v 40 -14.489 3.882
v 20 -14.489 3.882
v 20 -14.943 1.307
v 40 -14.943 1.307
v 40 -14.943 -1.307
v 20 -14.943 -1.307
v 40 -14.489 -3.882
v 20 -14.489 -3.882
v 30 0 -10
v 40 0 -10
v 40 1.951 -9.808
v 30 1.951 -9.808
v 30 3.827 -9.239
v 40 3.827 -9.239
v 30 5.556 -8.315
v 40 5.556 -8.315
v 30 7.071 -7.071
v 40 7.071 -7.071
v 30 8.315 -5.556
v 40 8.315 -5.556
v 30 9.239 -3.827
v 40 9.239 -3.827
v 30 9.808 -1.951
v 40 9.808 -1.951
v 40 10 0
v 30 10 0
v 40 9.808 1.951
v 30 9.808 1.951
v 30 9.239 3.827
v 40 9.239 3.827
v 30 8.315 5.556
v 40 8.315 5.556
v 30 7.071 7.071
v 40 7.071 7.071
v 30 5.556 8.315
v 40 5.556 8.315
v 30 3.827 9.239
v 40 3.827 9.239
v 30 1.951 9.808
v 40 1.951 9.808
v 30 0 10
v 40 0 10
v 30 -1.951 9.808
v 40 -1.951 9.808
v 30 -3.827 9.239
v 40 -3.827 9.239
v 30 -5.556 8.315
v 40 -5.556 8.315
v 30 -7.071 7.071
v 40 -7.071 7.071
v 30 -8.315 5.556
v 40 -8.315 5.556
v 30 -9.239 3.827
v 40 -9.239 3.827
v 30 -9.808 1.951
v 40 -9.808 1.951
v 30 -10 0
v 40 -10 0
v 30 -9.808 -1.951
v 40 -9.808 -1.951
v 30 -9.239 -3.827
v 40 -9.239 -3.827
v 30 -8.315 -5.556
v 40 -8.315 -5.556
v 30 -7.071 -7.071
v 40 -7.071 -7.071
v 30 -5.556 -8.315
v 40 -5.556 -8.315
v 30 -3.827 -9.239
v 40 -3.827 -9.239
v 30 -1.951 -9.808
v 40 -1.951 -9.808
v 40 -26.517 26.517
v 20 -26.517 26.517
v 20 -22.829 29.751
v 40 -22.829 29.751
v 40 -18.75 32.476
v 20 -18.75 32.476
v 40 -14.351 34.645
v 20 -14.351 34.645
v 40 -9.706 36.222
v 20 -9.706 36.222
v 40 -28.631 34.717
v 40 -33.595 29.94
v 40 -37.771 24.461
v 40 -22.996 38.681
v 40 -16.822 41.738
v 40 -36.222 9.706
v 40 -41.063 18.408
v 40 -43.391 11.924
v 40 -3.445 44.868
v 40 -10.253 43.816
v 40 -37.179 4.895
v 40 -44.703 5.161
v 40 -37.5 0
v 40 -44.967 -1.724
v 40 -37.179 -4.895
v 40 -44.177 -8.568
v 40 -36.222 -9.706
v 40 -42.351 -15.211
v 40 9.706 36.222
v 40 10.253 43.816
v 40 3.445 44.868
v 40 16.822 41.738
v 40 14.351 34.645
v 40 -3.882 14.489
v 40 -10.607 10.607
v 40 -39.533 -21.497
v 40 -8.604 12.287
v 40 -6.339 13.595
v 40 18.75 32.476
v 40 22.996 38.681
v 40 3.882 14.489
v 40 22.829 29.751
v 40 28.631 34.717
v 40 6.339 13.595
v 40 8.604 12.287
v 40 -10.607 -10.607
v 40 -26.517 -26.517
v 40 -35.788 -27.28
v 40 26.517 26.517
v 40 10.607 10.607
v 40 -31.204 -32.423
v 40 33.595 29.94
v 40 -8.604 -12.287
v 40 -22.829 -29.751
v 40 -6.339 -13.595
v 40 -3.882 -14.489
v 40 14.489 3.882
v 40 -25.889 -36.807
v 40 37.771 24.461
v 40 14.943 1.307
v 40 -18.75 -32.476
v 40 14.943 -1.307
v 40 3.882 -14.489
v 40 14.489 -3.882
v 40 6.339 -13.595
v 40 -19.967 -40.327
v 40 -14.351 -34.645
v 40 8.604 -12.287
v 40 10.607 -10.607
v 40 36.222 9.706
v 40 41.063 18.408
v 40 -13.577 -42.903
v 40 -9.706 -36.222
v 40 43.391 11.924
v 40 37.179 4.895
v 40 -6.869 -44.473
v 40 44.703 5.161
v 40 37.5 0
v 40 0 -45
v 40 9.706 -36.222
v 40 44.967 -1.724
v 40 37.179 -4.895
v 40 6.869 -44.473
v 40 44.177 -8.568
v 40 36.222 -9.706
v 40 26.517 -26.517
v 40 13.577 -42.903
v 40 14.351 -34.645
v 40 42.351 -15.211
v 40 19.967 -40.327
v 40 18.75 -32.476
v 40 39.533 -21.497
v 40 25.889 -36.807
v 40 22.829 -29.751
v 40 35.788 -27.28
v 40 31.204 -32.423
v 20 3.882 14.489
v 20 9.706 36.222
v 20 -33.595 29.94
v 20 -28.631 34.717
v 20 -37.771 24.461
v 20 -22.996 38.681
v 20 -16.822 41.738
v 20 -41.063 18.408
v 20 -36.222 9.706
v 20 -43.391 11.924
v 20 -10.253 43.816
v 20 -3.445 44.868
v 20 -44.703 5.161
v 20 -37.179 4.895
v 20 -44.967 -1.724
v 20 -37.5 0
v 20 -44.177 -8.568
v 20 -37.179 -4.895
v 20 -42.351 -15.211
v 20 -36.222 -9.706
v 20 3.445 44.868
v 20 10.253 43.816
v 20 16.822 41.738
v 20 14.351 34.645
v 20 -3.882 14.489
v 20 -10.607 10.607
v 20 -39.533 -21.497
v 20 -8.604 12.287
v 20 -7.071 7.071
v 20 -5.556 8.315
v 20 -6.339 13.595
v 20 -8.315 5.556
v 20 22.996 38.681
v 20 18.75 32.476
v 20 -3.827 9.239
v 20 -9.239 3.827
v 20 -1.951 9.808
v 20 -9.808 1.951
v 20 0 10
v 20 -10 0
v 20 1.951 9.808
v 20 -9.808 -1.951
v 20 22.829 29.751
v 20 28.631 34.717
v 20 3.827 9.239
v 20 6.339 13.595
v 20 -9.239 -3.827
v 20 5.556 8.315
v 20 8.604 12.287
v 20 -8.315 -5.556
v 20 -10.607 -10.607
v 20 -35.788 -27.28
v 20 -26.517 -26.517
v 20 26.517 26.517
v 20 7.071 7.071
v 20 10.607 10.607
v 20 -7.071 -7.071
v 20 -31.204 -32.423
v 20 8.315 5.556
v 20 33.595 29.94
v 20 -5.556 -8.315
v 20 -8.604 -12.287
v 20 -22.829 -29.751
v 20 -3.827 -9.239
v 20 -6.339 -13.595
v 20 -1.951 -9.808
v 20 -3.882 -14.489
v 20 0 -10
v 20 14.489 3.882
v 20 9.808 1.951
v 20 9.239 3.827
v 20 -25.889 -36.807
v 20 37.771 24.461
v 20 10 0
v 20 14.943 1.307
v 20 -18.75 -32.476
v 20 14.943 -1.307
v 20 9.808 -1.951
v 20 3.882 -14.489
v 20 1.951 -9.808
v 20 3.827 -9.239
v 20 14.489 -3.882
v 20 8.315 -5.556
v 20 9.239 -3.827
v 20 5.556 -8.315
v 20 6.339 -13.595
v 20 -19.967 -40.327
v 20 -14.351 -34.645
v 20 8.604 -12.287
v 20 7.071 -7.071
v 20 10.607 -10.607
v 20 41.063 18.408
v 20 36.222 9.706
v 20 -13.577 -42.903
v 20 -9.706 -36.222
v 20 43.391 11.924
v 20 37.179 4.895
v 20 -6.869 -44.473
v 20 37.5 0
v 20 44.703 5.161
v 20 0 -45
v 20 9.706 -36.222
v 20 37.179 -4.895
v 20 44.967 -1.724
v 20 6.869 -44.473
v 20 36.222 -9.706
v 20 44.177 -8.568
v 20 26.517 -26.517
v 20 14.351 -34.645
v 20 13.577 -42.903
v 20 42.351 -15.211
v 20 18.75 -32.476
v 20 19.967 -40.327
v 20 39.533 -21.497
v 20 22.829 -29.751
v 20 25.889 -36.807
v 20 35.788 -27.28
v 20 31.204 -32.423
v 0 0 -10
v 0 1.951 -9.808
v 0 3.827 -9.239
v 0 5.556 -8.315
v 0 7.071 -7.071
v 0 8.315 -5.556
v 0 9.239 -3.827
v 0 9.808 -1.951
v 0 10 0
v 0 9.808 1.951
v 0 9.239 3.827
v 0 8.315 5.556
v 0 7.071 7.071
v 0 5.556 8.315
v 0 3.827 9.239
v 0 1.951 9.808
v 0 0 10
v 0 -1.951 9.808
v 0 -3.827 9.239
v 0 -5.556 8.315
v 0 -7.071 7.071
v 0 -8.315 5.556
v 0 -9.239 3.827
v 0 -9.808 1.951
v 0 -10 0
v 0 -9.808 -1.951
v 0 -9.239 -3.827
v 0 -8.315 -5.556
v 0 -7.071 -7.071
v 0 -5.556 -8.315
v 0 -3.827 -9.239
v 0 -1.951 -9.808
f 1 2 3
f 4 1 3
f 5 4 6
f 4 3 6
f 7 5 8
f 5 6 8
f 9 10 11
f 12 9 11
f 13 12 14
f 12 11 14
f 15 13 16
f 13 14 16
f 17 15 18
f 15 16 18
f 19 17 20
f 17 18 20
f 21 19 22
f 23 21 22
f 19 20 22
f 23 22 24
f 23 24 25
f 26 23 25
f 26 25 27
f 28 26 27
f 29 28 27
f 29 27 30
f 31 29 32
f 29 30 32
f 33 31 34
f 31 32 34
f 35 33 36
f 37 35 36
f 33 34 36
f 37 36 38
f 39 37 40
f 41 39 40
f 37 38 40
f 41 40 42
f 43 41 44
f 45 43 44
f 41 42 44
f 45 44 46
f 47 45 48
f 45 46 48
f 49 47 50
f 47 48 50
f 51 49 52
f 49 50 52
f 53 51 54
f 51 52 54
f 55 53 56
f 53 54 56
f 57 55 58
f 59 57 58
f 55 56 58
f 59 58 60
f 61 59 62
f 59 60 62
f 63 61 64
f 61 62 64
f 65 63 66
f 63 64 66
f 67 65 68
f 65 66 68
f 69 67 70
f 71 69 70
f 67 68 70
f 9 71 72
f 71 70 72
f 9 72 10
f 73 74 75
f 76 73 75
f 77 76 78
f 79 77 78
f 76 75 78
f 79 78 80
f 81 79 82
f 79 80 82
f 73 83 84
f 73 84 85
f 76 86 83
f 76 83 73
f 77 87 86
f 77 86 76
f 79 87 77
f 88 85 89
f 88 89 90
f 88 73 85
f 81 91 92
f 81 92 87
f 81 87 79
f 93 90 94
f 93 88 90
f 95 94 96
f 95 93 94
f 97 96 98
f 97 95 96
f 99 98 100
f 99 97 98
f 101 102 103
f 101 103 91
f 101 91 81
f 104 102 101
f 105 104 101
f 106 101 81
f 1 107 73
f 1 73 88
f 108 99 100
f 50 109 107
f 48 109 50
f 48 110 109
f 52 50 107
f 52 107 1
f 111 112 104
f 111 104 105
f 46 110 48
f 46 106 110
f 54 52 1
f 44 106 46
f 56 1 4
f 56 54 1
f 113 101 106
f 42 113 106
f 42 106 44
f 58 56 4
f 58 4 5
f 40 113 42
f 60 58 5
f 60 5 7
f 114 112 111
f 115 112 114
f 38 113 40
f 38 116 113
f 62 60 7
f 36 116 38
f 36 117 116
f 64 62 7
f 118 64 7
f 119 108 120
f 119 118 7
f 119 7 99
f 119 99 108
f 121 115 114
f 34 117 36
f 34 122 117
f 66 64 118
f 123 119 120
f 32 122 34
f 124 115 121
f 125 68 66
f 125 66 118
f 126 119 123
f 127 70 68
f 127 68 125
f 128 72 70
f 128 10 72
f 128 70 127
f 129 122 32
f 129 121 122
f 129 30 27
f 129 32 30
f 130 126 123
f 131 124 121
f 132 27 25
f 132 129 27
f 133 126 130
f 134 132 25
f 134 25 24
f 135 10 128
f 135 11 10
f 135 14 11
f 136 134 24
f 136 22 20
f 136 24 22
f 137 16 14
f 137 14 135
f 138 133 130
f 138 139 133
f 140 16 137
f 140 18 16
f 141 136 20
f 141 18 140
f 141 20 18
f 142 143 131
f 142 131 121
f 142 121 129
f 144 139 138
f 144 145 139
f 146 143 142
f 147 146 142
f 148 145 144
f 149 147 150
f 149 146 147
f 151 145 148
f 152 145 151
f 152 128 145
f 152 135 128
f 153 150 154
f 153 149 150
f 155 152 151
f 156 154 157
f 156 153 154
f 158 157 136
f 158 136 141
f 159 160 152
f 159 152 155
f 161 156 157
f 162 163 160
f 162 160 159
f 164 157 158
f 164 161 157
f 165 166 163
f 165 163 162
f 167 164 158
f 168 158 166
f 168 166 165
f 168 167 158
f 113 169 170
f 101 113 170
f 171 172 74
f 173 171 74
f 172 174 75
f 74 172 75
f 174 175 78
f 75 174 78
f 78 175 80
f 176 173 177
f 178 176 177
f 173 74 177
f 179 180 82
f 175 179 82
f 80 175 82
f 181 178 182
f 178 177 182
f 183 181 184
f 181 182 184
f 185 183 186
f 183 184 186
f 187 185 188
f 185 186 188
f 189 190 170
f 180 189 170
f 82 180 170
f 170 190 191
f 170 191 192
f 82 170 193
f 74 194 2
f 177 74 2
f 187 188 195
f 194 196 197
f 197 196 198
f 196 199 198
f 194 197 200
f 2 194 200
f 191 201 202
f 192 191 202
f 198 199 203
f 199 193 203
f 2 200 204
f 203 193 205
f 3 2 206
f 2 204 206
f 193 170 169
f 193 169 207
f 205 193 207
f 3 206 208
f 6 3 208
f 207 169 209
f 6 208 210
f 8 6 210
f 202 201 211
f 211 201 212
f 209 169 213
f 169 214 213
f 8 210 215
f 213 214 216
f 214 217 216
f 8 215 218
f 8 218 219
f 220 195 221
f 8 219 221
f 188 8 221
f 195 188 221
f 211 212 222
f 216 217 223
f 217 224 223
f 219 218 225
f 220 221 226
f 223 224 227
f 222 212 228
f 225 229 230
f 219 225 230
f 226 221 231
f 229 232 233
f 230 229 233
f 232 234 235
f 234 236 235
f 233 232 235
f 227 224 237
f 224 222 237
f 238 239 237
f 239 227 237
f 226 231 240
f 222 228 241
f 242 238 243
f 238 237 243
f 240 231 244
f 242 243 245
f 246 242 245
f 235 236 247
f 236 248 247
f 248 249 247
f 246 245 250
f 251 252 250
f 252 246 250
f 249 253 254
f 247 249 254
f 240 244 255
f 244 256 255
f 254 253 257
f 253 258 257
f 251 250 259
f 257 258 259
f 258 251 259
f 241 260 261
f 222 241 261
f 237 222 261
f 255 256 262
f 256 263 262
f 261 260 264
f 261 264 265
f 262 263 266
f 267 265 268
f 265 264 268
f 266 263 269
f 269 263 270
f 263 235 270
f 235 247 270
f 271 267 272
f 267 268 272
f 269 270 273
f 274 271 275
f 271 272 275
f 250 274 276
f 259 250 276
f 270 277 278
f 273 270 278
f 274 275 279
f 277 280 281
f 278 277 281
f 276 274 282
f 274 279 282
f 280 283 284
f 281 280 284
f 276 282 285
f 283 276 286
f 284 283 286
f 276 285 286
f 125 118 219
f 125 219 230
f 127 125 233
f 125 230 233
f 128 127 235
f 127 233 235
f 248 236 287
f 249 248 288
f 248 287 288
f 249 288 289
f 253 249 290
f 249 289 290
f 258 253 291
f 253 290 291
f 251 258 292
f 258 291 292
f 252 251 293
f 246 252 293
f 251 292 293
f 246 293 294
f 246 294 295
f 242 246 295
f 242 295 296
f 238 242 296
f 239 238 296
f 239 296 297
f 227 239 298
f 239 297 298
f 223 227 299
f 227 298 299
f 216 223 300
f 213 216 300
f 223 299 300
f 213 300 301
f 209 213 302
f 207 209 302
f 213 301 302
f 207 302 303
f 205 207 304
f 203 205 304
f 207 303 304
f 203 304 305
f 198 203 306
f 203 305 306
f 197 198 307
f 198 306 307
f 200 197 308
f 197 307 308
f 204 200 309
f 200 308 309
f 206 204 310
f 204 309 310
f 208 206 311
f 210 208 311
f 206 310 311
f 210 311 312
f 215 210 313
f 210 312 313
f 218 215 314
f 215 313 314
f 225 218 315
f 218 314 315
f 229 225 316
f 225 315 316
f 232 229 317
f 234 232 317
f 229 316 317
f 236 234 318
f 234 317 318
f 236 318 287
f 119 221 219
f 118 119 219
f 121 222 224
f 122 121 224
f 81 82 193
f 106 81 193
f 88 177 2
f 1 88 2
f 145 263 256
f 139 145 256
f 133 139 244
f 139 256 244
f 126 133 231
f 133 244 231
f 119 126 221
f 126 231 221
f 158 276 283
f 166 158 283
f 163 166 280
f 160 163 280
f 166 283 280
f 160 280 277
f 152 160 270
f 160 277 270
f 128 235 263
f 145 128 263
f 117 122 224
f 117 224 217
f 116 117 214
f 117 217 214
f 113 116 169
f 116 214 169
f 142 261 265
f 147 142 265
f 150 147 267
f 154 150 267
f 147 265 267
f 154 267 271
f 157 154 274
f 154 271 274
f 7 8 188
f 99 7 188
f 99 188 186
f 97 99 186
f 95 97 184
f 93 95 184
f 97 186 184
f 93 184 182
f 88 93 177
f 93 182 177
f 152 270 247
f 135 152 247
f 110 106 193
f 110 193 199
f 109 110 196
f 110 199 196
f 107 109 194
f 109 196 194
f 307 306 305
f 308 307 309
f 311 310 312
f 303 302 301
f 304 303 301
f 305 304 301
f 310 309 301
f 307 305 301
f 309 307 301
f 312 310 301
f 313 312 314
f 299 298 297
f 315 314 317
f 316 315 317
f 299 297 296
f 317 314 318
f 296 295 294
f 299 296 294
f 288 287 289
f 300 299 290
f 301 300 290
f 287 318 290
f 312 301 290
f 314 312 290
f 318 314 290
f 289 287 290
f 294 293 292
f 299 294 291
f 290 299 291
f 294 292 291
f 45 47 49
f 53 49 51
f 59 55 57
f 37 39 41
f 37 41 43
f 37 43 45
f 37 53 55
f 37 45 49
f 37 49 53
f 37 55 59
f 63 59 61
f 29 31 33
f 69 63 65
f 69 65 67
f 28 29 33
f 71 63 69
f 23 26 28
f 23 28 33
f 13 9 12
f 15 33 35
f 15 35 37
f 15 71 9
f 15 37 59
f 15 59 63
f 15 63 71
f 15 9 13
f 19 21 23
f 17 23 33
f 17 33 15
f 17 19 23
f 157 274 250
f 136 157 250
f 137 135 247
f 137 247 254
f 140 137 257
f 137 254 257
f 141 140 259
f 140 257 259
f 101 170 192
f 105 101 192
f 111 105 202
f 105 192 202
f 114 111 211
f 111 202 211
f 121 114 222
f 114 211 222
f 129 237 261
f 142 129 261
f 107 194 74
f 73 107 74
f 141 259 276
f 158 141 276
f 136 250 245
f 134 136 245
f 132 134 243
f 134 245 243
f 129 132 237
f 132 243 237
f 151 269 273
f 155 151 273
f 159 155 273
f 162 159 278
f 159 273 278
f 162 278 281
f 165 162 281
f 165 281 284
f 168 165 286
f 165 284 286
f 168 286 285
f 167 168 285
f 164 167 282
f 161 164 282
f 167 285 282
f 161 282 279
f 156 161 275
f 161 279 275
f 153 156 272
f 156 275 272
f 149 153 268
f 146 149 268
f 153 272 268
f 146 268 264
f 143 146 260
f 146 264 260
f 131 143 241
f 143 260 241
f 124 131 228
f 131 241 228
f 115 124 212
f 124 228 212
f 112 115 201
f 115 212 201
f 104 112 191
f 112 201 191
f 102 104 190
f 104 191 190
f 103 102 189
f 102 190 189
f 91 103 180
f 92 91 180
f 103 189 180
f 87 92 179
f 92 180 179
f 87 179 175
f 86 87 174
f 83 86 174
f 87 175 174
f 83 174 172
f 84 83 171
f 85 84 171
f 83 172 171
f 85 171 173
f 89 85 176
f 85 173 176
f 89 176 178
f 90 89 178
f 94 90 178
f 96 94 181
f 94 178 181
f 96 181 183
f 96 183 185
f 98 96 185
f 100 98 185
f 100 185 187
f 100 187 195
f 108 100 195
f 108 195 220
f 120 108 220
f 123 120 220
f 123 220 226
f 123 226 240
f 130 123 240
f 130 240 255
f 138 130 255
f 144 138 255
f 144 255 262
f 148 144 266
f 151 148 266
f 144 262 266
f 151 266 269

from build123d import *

# Parameters (mm, degrees)
SKETCH_1_R          = 10
EXTRUDE_1_DEPTH     = 20
SKETCH_2_R          = 45
EXTRUDE_2_DEPTH     = 20
CUT_EXTRUDE_1_DEPTH = 20
SKETCH_4_R          = 10
CUT_EXTRUDE_2_DEPTH = 10


with BuildPart() as part:
    # 草图1 → 凸台-拉伸1 (new body)
    with BuildSketch(Plane(origin=(0, 0, 0), x_dir=(0, 0, -1), z_dir=(1, 0, 0))):
        Circle(SKETCH_1_R)
    extrude(amount=EXTRUDE_1_DEPTH)

    # 草图2 → 凸台-拉伸2 (add)
    with BuildSketch(Plane(origin=(20, 0, 0), x_dir=(0, 0, -1), z_dir=(1, 0, 0))):
        Circle(SKETCH_2_R)
    extrude(amount=EXTRUDE_2_DEPTH)

    # 草图3 → 切除-拉伸1 (cut)
    with BuildSketch(Plane.ZY.offset(-20)):
        with BuildLine():
            Line((-9.705714191, 36.222218486), (-3.882285677, 14.488887394))
            ThreePointArc((-3.882285677, 14.488887394), (0, 15), (3.882285677, 14.488887394))
            Line((3.882285677, 14.488887394), (9.705714191, 36.222218486))
            ThreePointArc((9.705714191, 36.222218486), (0, 37.5), (-9.705714191, 36.222218486))
        make_face()
        with BuildLine():
            Line((26.516504294, 26.516504294), (10.606601718, 10.606601718))
            ThreePointArc((10.606601718, 10.606601718), (12.990381057, 7.5), (14.488887394, 3.882285677))
            Line((14.488887394, 3.882285677), (36.222218486, 9.705714191))
            ThreePointArc((36.222218486, 9.705714191), (32.475952642, 18.75), (26.516504294, 26.516504294))
        make_face()
        with BuildLine():
            Line((36.222218486, -9.705714191), (14.488887394, -3.882285677))
            ThreePointArc((14.488887394, -3.882285677), (12.990381057, -7.5), (10.606601718, -10.606601718))
            Line((10.606601718, -10.606601718), (26.516504294, -26.516504294))
            ThreePointArc((26.516504294, -26.516504294), (32.475952642, -18.75), (36.222218486, -9.705714191))
        make_face()
        with BuildLine():
            Line((9.705714191, -36.222218486), (3.882285677, -14.488887394))
            ThreePointArc((3.882285677, -14.488887394), (0, -15), (-3.882285677, -14.488887394))
            Line((-3.882285677, -14.488887394), (-9.705714191, -36.222218486))
            ThreePointArc((-9.705714191, -36.222218486), (0, -37.5), (9.705714191, -36.222218486))
        make_face()
        with BuildLine():
            Line((-26.516504294, -26.516504294), (-10.606601718, -10.606601718))
            ThreePointArc((-10.606601718, -10.606601718), (-12.990381057, -7.5), (-14.488887394, -3.882285677))
            Line((-14.488887394, -3.882285677), (-36.222218486, -9.705714191))
            ThreePointArc((-36.222218486, -9.705714191), (-32.475952642, -18.75), (-26.516504294, -26.516504294))
        make_face()
        with BuildLine():
            Line((-36.222218486, 9.705714191), (-14.488887394, 3.882285677))
            ThreePointArc((-14.488887394, 3.882285677), (-12.990381057, 7.5), (-10.606601718, 10.606601718))
            Line((-10.606601718, 10.606601718), (-26.516504294, 26.516504294))
            ThreePointArc((-26.516504294, 26.516504294), (-32.475952642, 18.75), (-36.222218486, 9.705714191))
        make_face()
    extrude(amount=-CUT_EXTRUDE_1_DEPTH, mode=Mode.SUBTRACT)

    # 草图4 → 切除-拉伸2 (cut)
    with BuildSketch(Plane(origin=(40, 0, 0), x_dir=(0, 0, -1), z_dir=(1, 0, 0))):
        Circle(SKETCH_4_R)
    extrude(amount=-CUT_EXTRUDE_2_DEPTH, mode=Mode.SUBTRACT)


solid = part.part
